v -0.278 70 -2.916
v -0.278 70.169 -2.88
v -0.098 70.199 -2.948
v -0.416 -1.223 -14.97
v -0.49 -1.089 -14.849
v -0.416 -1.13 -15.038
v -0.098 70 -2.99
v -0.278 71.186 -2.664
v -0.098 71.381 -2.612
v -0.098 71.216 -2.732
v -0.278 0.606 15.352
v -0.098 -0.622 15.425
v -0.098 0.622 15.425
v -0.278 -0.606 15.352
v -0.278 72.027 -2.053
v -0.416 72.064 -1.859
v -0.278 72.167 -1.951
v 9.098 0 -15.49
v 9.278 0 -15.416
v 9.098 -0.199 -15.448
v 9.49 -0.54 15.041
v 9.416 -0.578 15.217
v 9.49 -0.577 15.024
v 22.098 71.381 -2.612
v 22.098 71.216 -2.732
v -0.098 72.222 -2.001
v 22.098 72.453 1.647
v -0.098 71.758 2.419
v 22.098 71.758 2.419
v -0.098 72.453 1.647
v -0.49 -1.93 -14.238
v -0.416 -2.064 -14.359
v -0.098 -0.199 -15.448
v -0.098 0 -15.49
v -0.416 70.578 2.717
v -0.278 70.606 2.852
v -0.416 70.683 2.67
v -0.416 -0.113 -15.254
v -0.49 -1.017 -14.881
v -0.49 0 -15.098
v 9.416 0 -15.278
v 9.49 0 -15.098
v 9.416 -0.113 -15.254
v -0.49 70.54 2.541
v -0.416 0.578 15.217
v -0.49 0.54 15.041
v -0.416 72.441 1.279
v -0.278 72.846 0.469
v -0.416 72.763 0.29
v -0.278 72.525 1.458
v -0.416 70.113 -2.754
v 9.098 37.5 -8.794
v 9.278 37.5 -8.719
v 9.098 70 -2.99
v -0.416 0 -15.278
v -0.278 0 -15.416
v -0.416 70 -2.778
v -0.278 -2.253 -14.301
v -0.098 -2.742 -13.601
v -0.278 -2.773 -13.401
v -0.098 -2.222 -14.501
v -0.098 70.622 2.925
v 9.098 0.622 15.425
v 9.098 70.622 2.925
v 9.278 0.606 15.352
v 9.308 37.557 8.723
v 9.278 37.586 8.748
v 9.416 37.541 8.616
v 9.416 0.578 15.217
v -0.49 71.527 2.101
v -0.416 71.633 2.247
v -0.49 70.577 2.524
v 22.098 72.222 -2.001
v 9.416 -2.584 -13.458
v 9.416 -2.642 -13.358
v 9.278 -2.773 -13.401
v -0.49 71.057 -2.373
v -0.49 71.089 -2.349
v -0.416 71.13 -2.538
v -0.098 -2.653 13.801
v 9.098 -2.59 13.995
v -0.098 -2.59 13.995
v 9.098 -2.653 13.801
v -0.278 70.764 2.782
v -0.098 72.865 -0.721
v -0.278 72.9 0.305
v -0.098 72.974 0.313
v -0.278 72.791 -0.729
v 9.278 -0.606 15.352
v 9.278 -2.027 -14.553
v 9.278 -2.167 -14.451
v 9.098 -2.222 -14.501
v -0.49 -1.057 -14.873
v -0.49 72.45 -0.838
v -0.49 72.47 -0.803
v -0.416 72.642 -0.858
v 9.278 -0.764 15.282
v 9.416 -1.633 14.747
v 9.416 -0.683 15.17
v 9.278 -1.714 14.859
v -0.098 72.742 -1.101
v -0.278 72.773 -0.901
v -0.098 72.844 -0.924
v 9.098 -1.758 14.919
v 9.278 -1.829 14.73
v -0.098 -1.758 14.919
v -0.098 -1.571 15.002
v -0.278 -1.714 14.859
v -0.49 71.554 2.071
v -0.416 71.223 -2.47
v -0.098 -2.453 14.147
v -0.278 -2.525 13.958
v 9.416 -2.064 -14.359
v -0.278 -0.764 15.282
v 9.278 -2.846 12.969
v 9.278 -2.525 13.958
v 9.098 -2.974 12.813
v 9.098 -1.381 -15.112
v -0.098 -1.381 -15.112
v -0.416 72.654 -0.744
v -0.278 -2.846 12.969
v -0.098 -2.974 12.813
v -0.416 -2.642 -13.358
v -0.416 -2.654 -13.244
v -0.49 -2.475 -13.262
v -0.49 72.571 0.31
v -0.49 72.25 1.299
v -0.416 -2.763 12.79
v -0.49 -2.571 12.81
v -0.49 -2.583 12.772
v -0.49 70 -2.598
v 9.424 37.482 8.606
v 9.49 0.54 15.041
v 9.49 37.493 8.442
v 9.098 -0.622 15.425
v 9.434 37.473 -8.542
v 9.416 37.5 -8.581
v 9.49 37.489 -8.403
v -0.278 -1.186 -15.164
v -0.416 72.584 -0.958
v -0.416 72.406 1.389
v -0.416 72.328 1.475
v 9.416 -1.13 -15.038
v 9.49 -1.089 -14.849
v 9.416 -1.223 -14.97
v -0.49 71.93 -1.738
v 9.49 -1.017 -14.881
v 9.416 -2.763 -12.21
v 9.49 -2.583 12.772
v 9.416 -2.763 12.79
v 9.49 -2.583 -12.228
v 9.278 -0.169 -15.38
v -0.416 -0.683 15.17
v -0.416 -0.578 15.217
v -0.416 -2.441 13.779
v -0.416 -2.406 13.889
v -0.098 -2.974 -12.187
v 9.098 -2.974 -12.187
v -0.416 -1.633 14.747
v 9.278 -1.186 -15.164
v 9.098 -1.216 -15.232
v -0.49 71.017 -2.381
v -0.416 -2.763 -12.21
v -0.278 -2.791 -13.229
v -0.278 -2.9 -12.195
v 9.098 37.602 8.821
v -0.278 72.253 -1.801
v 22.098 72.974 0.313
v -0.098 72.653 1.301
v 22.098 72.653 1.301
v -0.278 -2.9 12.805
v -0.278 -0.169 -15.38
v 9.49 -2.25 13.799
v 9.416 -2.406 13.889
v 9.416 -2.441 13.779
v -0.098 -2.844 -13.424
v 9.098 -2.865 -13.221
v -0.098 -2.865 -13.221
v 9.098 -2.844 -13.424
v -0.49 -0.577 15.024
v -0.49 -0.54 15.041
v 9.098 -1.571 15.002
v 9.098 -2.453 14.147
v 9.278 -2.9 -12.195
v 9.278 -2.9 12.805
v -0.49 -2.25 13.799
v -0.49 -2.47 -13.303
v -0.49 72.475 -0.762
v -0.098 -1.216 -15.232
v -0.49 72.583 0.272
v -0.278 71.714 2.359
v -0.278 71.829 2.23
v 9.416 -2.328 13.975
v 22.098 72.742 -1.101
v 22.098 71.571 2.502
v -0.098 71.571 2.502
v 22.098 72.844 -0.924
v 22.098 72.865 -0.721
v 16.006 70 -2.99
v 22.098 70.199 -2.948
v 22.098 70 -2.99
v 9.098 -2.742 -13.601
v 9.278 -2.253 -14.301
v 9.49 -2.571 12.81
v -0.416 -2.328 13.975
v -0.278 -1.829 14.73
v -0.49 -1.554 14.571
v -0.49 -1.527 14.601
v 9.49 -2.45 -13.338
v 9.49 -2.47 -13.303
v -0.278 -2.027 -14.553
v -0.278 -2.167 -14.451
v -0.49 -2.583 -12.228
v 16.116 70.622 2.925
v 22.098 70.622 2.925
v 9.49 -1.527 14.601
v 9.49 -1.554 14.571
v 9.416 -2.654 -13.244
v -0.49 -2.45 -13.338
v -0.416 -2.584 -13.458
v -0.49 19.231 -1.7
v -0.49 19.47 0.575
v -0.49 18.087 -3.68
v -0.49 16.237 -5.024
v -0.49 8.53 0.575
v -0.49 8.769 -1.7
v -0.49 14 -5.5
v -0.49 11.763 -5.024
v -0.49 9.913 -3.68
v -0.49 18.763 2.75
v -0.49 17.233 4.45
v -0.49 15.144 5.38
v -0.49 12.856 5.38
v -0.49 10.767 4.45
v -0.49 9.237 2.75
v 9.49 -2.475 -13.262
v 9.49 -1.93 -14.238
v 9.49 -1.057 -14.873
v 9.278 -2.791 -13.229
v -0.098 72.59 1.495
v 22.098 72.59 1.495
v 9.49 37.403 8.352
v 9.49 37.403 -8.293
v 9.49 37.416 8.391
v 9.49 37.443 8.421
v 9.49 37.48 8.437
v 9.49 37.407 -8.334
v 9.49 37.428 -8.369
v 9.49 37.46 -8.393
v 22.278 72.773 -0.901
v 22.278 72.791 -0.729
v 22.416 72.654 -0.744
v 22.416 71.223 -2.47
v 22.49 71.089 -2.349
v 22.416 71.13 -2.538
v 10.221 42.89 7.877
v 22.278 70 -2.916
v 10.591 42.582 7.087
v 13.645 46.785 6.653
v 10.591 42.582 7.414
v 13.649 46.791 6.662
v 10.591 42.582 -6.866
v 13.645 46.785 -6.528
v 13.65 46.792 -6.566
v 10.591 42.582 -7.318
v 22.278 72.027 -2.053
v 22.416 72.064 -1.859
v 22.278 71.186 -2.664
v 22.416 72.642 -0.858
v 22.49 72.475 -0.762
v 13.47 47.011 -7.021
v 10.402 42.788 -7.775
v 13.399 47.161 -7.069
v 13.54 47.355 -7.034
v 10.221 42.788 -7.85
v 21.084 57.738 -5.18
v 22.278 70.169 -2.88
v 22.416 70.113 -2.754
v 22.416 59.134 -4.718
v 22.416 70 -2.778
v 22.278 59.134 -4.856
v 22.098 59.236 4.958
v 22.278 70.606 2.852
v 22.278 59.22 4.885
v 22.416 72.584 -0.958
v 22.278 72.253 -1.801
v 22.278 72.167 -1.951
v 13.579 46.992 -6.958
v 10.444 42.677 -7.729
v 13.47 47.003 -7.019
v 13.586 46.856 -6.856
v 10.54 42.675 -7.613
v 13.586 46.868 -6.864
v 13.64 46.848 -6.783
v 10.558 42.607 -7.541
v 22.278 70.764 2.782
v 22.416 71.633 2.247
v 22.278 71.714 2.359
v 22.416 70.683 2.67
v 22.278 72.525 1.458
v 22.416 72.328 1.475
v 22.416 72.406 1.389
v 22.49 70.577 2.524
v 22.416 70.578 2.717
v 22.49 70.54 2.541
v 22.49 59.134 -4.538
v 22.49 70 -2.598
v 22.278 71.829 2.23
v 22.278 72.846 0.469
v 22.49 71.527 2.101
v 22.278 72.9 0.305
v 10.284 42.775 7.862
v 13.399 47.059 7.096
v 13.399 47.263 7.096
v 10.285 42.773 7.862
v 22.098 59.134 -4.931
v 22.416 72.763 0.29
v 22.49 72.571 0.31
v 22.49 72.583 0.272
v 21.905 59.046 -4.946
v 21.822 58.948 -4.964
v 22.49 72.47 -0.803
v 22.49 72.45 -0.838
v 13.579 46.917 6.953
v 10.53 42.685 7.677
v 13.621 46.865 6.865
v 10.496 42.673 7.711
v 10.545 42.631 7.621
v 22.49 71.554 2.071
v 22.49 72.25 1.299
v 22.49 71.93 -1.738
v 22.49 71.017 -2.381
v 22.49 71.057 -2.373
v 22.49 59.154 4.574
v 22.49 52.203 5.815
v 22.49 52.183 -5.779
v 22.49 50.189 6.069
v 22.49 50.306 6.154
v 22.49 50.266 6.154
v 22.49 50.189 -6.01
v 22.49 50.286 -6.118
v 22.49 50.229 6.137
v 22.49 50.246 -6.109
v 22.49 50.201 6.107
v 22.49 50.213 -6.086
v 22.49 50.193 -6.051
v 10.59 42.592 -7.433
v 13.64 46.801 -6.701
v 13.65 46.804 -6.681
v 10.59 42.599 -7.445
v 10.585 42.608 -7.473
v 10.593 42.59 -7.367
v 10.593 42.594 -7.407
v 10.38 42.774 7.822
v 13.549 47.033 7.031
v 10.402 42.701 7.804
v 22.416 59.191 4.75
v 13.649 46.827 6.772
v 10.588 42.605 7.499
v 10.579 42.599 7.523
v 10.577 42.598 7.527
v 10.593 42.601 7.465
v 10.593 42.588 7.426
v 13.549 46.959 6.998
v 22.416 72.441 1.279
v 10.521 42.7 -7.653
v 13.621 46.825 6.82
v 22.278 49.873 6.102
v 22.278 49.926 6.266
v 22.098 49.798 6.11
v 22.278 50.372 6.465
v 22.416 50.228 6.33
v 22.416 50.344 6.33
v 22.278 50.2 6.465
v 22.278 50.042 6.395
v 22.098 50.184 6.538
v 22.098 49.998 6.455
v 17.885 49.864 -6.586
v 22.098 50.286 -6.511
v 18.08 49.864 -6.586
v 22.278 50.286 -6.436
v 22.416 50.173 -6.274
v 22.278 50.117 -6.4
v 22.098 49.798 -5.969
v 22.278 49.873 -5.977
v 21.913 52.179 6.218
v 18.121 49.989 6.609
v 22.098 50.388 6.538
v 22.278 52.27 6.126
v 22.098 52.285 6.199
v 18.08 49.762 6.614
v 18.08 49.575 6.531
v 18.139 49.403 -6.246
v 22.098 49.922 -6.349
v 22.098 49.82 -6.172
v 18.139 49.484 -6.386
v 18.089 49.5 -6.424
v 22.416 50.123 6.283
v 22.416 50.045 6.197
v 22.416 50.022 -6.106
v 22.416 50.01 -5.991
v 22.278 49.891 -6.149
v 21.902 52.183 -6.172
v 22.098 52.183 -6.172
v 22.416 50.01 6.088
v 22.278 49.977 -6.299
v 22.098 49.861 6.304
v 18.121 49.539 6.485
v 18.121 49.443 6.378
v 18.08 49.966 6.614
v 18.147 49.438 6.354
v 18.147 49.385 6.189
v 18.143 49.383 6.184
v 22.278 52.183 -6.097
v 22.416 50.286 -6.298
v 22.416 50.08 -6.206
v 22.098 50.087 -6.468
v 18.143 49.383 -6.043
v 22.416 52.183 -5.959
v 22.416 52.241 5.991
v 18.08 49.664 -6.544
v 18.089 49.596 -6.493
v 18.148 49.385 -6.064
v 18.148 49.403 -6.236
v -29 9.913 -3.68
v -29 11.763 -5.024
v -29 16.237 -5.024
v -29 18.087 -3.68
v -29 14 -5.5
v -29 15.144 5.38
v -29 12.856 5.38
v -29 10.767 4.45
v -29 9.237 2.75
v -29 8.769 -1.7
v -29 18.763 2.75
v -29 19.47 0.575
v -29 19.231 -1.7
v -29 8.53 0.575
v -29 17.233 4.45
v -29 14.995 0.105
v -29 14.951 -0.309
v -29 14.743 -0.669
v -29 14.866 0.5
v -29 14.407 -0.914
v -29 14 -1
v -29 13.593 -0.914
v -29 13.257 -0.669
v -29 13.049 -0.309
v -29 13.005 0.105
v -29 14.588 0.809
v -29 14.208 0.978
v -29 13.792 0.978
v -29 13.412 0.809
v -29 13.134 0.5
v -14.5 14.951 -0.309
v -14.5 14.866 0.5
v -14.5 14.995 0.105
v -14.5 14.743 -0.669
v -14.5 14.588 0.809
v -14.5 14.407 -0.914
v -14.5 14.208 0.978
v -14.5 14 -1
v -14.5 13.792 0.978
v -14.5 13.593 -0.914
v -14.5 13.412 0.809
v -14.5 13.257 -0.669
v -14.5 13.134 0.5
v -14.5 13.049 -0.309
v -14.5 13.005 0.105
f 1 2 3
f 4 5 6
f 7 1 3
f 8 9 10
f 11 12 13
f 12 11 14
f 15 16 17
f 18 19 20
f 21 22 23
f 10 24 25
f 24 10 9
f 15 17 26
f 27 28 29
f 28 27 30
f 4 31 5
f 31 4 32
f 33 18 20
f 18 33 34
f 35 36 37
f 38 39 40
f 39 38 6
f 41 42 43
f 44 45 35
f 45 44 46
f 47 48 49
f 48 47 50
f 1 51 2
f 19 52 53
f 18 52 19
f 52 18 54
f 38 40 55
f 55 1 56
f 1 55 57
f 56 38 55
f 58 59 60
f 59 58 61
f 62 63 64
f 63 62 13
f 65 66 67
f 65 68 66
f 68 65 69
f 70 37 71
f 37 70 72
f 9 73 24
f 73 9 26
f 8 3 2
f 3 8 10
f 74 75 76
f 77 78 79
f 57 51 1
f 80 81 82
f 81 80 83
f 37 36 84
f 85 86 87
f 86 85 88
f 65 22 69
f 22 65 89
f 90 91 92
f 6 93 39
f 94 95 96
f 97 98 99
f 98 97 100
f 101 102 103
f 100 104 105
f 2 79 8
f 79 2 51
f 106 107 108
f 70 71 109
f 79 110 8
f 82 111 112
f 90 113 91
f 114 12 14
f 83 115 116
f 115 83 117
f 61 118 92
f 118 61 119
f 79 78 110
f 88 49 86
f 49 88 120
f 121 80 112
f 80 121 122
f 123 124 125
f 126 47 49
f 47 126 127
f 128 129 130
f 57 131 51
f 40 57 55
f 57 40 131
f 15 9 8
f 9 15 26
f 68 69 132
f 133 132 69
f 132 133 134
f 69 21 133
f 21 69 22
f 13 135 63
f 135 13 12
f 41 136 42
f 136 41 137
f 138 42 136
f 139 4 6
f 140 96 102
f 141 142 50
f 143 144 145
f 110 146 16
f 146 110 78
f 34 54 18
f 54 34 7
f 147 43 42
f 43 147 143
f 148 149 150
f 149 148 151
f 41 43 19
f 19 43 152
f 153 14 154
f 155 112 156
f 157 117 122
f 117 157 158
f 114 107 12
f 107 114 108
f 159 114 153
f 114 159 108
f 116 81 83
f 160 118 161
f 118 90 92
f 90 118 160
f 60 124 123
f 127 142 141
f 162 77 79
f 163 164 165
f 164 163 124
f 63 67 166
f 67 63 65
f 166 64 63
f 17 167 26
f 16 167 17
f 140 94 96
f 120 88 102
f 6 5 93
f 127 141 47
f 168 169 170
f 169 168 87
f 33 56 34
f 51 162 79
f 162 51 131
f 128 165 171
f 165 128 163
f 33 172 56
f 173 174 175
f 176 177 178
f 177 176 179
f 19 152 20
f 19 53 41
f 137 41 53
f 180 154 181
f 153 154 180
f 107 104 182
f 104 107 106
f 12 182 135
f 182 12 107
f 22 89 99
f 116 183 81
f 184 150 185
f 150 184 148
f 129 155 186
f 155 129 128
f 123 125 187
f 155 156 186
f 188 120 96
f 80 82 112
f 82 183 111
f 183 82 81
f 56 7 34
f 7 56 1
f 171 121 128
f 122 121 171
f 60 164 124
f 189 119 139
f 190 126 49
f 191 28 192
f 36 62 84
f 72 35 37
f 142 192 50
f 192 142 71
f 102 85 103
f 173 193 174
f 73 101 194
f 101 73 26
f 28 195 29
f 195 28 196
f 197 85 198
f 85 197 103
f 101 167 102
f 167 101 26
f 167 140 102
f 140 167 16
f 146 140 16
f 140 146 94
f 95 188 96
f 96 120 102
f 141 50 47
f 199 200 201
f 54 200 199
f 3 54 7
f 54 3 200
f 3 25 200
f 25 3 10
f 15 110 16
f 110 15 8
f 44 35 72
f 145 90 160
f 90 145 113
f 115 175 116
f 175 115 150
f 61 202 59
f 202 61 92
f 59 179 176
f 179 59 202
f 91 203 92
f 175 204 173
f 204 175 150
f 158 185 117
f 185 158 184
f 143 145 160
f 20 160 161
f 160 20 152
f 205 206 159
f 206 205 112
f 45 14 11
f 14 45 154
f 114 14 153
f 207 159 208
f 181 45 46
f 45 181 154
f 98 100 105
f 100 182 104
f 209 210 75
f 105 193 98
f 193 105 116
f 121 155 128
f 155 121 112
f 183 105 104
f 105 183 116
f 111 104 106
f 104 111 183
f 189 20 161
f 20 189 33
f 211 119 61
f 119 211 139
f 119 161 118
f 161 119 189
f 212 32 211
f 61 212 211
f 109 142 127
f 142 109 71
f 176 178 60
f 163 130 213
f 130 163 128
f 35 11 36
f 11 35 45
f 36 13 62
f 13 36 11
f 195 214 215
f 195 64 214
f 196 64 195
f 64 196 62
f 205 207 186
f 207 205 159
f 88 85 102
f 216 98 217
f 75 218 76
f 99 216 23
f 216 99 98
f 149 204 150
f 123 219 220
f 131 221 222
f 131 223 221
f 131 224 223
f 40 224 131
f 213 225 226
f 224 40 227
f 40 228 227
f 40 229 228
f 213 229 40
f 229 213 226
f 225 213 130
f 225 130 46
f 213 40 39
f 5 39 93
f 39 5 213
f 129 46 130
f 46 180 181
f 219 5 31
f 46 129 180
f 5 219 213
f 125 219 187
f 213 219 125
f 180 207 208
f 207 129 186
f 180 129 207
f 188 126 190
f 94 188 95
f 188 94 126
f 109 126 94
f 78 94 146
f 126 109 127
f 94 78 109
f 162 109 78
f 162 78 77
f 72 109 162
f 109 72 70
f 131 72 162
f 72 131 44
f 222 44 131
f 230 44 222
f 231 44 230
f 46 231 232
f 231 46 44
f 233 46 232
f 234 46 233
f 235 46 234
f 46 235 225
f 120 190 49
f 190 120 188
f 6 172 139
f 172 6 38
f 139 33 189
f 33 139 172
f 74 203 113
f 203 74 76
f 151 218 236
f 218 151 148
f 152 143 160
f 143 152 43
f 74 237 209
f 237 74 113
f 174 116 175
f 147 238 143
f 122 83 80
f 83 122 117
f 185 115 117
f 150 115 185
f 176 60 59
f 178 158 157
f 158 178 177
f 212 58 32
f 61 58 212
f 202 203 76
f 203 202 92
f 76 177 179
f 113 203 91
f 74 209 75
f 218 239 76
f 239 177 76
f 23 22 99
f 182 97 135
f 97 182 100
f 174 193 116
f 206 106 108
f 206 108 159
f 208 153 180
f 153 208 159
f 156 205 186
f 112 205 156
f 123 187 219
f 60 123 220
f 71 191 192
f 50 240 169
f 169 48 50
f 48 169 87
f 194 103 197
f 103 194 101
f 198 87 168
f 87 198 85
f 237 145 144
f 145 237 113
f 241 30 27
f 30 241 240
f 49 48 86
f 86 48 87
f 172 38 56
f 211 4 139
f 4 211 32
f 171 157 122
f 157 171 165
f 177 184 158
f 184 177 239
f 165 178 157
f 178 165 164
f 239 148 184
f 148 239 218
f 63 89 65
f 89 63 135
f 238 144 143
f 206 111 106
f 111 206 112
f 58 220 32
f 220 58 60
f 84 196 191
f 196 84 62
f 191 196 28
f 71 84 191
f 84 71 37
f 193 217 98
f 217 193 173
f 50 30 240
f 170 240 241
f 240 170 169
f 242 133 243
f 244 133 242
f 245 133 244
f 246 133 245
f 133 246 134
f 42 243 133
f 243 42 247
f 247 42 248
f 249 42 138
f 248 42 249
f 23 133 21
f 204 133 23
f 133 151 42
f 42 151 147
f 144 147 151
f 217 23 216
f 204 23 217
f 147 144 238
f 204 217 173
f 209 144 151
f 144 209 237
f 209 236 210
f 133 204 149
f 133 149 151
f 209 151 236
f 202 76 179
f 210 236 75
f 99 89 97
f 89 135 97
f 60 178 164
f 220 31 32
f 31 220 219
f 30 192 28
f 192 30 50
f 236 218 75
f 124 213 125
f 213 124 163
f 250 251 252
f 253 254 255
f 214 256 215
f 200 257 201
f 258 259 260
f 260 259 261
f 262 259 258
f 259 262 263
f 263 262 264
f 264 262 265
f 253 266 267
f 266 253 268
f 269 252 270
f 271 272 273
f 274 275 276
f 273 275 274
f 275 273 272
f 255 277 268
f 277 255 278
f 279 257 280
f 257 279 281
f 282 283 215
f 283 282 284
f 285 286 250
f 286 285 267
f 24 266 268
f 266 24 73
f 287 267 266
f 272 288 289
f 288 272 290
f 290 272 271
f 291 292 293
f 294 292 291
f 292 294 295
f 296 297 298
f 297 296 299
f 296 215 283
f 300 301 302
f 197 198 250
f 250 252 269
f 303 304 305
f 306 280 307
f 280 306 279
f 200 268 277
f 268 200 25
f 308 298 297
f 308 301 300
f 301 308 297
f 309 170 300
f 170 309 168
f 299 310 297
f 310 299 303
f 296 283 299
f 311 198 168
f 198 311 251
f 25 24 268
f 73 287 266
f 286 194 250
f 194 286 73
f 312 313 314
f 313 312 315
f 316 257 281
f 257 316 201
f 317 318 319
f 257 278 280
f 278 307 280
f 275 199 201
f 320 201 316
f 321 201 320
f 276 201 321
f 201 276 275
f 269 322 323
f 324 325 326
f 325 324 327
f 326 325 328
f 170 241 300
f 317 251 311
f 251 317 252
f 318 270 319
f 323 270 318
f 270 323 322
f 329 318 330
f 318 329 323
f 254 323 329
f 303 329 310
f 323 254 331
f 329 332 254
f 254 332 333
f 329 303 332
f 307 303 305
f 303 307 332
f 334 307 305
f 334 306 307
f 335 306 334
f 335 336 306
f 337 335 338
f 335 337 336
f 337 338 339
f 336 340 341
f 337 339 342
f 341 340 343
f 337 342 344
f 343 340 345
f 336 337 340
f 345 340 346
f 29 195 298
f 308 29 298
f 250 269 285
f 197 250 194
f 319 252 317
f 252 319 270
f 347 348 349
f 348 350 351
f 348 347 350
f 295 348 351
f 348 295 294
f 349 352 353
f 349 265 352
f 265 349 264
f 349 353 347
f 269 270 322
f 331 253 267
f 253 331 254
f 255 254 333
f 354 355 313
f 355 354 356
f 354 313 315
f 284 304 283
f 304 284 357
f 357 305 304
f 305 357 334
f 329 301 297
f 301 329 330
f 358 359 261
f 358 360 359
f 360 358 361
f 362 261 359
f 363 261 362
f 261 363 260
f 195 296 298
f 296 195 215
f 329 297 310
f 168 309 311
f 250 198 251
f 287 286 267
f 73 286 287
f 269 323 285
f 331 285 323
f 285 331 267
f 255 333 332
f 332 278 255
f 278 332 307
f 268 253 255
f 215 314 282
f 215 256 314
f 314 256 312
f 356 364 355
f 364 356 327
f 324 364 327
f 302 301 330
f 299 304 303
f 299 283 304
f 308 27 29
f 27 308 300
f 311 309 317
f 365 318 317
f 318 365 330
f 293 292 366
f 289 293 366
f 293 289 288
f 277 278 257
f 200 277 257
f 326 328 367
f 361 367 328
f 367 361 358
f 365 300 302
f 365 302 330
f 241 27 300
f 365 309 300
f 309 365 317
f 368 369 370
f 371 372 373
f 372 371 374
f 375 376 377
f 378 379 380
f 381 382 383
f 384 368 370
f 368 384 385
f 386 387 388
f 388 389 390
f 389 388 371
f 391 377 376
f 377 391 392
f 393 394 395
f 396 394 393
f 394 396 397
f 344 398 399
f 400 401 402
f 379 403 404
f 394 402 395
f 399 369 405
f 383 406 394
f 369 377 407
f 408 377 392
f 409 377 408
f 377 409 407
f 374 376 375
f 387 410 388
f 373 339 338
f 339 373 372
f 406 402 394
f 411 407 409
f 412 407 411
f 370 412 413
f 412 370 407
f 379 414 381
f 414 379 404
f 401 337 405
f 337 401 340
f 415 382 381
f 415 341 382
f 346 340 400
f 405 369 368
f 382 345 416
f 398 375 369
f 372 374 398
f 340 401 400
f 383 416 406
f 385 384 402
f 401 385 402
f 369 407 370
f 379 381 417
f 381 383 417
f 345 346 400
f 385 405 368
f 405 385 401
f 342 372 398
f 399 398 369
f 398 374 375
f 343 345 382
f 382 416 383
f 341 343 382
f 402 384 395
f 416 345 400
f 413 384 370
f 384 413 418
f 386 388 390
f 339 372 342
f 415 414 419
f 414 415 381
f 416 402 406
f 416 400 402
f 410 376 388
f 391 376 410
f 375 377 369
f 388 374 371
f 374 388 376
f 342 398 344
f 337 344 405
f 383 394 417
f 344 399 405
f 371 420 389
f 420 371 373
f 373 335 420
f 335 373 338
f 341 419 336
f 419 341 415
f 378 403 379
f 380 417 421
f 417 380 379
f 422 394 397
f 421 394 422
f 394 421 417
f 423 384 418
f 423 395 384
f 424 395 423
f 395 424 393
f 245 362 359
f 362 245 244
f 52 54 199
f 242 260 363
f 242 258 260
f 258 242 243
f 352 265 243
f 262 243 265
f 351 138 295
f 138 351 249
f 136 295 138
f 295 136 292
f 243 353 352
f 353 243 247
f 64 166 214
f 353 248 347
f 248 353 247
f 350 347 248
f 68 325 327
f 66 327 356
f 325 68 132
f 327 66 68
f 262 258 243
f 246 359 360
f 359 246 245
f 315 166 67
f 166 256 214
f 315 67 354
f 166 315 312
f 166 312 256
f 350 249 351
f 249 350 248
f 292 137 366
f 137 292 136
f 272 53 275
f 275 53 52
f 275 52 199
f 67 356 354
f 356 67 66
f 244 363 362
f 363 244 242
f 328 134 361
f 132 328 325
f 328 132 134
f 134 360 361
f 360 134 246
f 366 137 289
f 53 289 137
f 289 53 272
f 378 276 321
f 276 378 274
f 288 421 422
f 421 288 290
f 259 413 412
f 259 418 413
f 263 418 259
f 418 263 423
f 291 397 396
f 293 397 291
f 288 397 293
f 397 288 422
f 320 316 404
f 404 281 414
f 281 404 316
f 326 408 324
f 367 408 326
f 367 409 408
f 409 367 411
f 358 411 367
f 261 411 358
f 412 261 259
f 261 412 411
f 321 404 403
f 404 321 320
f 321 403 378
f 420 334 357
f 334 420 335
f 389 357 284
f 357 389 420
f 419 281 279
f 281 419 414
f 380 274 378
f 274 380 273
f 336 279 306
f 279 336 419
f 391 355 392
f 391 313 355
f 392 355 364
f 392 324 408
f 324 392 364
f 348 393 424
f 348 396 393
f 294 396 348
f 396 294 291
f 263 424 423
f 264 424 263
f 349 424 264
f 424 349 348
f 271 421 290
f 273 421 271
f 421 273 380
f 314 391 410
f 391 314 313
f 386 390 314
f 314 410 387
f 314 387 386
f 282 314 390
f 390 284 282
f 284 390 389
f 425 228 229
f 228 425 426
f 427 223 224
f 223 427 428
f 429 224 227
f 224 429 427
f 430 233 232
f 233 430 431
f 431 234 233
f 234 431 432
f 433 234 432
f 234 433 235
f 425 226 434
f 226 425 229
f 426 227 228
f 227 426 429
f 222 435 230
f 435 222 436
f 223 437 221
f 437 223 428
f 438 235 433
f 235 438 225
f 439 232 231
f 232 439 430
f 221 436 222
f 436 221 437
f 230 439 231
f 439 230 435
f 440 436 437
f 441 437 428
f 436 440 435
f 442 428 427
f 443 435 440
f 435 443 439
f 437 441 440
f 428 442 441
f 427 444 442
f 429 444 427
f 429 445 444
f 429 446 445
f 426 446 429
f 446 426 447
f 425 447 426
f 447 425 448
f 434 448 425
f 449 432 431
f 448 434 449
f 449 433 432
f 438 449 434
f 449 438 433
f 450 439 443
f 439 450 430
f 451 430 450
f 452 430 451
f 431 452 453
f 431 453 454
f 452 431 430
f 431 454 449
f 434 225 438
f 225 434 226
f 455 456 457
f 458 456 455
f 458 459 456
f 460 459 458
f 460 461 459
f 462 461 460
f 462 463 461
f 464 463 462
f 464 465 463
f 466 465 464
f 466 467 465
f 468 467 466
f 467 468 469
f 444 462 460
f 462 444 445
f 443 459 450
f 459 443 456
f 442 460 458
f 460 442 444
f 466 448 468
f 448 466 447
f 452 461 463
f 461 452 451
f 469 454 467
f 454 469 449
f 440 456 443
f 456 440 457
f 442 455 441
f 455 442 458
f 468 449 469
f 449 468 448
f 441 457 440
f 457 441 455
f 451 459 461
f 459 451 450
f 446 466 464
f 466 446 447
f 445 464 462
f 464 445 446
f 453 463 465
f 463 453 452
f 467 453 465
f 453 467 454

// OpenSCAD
handleWidth = 30;
handleLength = 75;
thinBit = 9;
thickBit = 22;
shaftDiameter = 11;
shaftLength = 29;
shaftOffset = 17;
scewDiameter = 2;

edging = 1;

$fn = 15;
rotate([0,90,0])
union()
{
minkowski()
{
	difference()
	{
		hull()
		{
			translate([handleWidth/2 - 2.5,0,0]) cylinder(d=5, h=22);
			translate([-handleWidth/2 + 2.5,0,0]) cylinder(d=5, h=22);
			translate([0,handleLength - 5,0]) cylinder(d=5, h=22);
		}
		// cut out for making the handle shape
		hull()
		{
			translate([-handleWidth, handleLength/2,thinBit + thickBit-thinBit]) rotate([0,90,0]) cylinder(r=thickBit-thinBit, h=handleWidth * 2);
			translate([-handleWidth/2,-handleLength/2,thinBit]) cube([handleWidth,handleLength,thickBit]);
		}
	}
	// round the edges
	sphere(d=edging); 
}
// The shaft	
translate([0,shaftOffset + 2.5 - shaftDiameter/2,-shaftLength]) 
{
	difference()
	{
		cylinder(d=shaftDiameter, h=shaftLength);
		cylinder(d=scewDiameter, h=shaftLength/2);
	}
}

}
